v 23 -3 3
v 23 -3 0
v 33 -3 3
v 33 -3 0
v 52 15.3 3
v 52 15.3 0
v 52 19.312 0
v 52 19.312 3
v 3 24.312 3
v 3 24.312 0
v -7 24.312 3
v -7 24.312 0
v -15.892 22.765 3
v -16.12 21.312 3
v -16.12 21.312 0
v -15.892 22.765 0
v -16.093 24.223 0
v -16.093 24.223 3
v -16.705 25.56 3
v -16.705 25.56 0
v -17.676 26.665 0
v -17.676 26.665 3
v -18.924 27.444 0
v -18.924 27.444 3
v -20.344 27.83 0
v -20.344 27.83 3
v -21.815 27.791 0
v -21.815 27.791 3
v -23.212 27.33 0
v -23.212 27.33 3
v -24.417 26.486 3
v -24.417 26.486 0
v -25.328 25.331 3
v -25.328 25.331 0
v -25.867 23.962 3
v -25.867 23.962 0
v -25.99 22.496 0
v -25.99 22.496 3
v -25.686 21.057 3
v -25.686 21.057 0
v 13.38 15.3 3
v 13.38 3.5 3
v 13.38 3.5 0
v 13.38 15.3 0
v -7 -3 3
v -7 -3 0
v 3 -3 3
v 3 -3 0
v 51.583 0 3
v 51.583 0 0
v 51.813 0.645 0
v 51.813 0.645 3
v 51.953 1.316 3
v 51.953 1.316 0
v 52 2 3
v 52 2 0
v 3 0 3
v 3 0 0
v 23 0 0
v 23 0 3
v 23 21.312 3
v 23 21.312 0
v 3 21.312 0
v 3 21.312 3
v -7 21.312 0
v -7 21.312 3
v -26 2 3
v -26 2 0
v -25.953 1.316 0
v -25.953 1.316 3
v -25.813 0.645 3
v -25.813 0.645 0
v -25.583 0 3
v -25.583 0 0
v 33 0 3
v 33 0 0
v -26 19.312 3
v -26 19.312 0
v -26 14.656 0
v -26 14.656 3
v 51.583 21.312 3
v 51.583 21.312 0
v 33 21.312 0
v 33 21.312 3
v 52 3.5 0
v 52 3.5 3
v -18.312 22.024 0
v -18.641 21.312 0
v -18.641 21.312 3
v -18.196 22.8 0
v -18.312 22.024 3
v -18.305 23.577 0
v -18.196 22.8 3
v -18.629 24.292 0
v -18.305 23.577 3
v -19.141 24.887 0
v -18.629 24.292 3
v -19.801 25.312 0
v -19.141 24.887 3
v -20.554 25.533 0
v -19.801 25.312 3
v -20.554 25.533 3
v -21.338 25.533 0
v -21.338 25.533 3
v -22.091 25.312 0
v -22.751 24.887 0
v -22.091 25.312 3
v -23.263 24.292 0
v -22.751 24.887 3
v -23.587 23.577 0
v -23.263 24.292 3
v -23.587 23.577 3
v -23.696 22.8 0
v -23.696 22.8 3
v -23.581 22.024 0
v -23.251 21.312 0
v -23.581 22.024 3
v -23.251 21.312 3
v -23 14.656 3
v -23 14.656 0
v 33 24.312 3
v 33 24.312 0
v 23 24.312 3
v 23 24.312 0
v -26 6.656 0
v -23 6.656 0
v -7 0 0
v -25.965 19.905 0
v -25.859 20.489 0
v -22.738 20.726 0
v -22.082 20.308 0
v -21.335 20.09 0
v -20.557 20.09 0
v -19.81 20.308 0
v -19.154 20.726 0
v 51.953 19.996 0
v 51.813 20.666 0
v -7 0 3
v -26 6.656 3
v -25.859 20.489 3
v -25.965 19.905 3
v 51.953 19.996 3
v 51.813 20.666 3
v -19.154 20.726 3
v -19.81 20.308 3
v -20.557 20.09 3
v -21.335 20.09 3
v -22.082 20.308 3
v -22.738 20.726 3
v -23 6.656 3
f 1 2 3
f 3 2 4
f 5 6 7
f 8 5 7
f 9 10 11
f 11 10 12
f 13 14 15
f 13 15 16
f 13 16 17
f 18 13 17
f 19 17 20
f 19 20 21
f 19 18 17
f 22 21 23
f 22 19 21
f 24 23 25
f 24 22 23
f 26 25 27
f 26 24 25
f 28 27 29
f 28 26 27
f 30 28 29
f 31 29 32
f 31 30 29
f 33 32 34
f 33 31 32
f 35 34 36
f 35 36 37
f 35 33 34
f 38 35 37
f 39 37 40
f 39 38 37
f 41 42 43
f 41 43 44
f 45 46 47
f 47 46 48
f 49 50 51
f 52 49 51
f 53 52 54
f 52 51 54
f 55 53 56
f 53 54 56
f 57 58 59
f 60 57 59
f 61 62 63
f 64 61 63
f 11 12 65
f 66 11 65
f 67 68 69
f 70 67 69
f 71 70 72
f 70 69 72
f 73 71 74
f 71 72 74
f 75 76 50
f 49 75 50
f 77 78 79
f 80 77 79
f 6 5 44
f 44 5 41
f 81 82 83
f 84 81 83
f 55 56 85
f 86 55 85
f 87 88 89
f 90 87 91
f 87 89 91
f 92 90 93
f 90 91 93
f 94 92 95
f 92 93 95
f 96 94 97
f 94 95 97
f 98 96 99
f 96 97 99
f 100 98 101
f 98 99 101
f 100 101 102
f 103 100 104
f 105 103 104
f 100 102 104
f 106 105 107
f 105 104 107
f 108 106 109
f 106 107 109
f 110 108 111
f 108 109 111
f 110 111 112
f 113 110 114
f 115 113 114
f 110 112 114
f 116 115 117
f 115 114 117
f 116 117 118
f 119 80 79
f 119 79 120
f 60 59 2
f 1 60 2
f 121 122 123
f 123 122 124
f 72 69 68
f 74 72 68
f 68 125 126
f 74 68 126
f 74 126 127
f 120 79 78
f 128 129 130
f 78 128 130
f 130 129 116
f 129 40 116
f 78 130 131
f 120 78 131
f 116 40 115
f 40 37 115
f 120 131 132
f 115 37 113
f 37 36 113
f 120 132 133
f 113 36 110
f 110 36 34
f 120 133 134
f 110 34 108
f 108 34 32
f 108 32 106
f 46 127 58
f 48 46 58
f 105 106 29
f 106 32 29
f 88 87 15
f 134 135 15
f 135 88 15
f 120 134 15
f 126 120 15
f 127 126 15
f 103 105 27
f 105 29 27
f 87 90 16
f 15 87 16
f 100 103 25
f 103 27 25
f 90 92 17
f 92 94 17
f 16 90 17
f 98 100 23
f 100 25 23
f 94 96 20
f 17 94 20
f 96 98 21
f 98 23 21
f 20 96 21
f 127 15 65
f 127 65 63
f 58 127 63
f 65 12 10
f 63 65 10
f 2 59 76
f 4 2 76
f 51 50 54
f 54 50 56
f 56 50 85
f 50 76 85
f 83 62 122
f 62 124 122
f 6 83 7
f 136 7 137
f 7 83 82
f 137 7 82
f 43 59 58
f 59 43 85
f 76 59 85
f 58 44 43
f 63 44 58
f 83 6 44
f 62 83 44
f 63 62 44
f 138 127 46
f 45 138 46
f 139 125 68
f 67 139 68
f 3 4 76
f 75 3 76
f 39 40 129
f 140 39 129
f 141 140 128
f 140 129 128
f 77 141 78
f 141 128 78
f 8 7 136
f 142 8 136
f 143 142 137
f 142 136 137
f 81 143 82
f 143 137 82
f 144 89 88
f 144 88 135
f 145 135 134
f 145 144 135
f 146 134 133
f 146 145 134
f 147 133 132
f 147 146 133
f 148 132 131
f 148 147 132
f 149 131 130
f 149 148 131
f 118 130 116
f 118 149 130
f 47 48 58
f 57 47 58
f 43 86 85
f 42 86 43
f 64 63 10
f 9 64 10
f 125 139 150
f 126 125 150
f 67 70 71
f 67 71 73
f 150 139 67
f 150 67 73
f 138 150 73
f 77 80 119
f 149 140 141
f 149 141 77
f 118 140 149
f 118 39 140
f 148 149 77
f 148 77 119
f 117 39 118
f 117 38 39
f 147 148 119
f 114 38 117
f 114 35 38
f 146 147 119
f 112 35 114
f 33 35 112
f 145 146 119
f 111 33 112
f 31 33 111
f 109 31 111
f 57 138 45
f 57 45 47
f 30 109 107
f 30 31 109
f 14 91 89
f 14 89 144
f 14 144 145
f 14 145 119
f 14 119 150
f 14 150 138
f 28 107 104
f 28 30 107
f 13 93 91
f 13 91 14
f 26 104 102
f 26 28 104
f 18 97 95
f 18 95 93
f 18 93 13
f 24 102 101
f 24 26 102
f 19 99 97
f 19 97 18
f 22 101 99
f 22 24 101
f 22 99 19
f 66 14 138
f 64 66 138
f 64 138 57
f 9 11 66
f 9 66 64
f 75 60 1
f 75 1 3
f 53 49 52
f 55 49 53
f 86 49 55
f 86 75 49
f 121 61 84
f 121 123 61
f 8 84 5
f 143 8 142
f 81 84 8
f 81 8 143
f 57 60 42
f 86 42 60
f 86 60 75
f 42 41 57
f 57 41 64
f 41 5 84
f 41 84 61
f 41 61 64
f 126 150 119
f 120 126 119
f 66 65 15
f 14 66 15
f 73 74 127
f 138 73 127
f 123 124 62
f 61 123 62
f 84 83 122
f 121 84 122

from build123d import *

# Parameters (mm, degrees)
BOSS_EXTRUDE1_DEPTH = 3
CUT_EXTRUDE1_REACH  = 5
SKETCH3_R           = 5.053902861
SKETCH3_R_2         = 2.749769833
BOSS_EXTRUDE2_DEPTH = 3
CUT_EXTRUDE2_REACH  = 5
SKETCH5_W           = 3
SKETCH5_H           = 8
CUT_EXTRUDE3_DEPTH  = 3


with BuildPart() as part:
    # Sketch1 → Boss-Extrude1 (new body)
    with BuildSketch(Plane.XY):
        with BuildLine():
            Line((-7, -3), (3, -3))
            Line((3, -3), (3, 0))
            Line((3, 0), (23, 0))
            Line((23, 0), (23, -3))
            Line((23, -3), (33, -3))
            Line((33, -3), (33, 0))
            Line((33, 0), (51.582575695, 0))
            ThreePointArc((51.582575695, 0), (51.894531565, 0.978451782), (52, 2))
            Line((52, 2), (52, 19.311841589))
            ThreePointArc((52, 19.311841589), (51.894531565, 20.333389808), (51.582575695, 21.311841589))
            Line((51.582575695, 21.311841589), (33, 21.311841589))
            Line((33, 21.311841589), (33, 24.311841589))
            Line((33, 24.311841589), (23, 24.311841589))
            Line((23, 24.311841589), (23, 21.311841589))
            Line((23, 21.311841589), (3, 21.311841589))
            Line((3, 21.311841589), (3, 24.311841589))
            Line((3, 24.311841589), (-7, 24.311841589))
            Line((-7, 24.311841589), (-7, 21.311841589))
            Line((-7, 21.311841589), (-25.582575695, 21.311841589))
            ThreePointArc((-25.582575695, 21.311841589), (-25.894531565, 20.333389808), (-26, 19.311841589))
            Line((-26, 19.311841589), (-26, 2))
            ThreePointArc((-26, 2), (-25.894531565, 0.978451782), (-25.582575695, 0))
            Line((-25.582575695, 0), (-7, 0))
            Line((-7, 0), (-7, -3))
        make_face()
    extrude(amount=BOSS_EXTRUDE1_DEPTH)

    # Sketch2 → Cut-Extrude1 (cut, up to next)
    with BuildSketch(Plane.XY.offset(3), mode=Mode.PRIVATE) as cut_extrude1_sk1:
        Polygon((13.38, 3.5), (13.38, 15.3), (23.54, 15.3), (52, 15.3), (52, 3.5), align=None)
    cut_extrude1_tool1 = extrude(cut_extrude1_sk1.sketch, amount=-CUT_EXTRUDE1_REACH, mode=Mode.PRIVATE) & part.part
    add(cut_extrude1_tool1.solids().sort_by_distance((32.69, 9.4, 3))[0], mode=Mode.SUBTRACT)

    # Sketch3 → Boss-Extrude2 (add)
    with BuildSketch(Plane.XY.offset(3)):
        with Locations((-20.946097139, 22.811841589)):
            Circle(SKETCH3_R)
        with Locations((-20.946097139, 22.811841589)):
            Circle(SKETCH3_R_2, mode=Mode.SUBTRACT)
    extrude(amount=-BOSS_EXTRUDE2_DEPTH)

    # Sketch4 → Cut-Extrude2 (cut, up to next)
    with BuildSketch(Plane.XY.offset(3), mode=Mode.PRIVATE) as cut_extrude2_sk1:
        with BuildLine():
            Line((-23.250708633, 21.311841589), (-18.641485645, 21.311841589))
            ThreePointArc((-18.641485645, 21.311841589), (-20.946097139, 20.062071756), (-23.250708633, 21.311841589))
        make_face()
    cut_extrude2_tool1 = extrude(cut_extrude2_sk1.sketch, amount=-CUT_EXTRUDE2_REACH, mode=Mode.PRIVATE) & part.part
    add(cut_extrude2_tool1.solids().sort_by_distance((-20.946097, 20.800705, 3))[0], mode=Mode.SUBTRACT)

    # Sketch5 → Cut-Extrude3 (cut)
    with BuildSketch(Plane.XY.offset(3)):
        with Locations((-24.5, 10.655920795)):
            Rectangle(SKETCH5_W, SKETCH5_H)
    extrude(amount=-CUT_EXTRUDE3_DEPTH, mode=Mode.SUBTRACT)


solid = part.part
